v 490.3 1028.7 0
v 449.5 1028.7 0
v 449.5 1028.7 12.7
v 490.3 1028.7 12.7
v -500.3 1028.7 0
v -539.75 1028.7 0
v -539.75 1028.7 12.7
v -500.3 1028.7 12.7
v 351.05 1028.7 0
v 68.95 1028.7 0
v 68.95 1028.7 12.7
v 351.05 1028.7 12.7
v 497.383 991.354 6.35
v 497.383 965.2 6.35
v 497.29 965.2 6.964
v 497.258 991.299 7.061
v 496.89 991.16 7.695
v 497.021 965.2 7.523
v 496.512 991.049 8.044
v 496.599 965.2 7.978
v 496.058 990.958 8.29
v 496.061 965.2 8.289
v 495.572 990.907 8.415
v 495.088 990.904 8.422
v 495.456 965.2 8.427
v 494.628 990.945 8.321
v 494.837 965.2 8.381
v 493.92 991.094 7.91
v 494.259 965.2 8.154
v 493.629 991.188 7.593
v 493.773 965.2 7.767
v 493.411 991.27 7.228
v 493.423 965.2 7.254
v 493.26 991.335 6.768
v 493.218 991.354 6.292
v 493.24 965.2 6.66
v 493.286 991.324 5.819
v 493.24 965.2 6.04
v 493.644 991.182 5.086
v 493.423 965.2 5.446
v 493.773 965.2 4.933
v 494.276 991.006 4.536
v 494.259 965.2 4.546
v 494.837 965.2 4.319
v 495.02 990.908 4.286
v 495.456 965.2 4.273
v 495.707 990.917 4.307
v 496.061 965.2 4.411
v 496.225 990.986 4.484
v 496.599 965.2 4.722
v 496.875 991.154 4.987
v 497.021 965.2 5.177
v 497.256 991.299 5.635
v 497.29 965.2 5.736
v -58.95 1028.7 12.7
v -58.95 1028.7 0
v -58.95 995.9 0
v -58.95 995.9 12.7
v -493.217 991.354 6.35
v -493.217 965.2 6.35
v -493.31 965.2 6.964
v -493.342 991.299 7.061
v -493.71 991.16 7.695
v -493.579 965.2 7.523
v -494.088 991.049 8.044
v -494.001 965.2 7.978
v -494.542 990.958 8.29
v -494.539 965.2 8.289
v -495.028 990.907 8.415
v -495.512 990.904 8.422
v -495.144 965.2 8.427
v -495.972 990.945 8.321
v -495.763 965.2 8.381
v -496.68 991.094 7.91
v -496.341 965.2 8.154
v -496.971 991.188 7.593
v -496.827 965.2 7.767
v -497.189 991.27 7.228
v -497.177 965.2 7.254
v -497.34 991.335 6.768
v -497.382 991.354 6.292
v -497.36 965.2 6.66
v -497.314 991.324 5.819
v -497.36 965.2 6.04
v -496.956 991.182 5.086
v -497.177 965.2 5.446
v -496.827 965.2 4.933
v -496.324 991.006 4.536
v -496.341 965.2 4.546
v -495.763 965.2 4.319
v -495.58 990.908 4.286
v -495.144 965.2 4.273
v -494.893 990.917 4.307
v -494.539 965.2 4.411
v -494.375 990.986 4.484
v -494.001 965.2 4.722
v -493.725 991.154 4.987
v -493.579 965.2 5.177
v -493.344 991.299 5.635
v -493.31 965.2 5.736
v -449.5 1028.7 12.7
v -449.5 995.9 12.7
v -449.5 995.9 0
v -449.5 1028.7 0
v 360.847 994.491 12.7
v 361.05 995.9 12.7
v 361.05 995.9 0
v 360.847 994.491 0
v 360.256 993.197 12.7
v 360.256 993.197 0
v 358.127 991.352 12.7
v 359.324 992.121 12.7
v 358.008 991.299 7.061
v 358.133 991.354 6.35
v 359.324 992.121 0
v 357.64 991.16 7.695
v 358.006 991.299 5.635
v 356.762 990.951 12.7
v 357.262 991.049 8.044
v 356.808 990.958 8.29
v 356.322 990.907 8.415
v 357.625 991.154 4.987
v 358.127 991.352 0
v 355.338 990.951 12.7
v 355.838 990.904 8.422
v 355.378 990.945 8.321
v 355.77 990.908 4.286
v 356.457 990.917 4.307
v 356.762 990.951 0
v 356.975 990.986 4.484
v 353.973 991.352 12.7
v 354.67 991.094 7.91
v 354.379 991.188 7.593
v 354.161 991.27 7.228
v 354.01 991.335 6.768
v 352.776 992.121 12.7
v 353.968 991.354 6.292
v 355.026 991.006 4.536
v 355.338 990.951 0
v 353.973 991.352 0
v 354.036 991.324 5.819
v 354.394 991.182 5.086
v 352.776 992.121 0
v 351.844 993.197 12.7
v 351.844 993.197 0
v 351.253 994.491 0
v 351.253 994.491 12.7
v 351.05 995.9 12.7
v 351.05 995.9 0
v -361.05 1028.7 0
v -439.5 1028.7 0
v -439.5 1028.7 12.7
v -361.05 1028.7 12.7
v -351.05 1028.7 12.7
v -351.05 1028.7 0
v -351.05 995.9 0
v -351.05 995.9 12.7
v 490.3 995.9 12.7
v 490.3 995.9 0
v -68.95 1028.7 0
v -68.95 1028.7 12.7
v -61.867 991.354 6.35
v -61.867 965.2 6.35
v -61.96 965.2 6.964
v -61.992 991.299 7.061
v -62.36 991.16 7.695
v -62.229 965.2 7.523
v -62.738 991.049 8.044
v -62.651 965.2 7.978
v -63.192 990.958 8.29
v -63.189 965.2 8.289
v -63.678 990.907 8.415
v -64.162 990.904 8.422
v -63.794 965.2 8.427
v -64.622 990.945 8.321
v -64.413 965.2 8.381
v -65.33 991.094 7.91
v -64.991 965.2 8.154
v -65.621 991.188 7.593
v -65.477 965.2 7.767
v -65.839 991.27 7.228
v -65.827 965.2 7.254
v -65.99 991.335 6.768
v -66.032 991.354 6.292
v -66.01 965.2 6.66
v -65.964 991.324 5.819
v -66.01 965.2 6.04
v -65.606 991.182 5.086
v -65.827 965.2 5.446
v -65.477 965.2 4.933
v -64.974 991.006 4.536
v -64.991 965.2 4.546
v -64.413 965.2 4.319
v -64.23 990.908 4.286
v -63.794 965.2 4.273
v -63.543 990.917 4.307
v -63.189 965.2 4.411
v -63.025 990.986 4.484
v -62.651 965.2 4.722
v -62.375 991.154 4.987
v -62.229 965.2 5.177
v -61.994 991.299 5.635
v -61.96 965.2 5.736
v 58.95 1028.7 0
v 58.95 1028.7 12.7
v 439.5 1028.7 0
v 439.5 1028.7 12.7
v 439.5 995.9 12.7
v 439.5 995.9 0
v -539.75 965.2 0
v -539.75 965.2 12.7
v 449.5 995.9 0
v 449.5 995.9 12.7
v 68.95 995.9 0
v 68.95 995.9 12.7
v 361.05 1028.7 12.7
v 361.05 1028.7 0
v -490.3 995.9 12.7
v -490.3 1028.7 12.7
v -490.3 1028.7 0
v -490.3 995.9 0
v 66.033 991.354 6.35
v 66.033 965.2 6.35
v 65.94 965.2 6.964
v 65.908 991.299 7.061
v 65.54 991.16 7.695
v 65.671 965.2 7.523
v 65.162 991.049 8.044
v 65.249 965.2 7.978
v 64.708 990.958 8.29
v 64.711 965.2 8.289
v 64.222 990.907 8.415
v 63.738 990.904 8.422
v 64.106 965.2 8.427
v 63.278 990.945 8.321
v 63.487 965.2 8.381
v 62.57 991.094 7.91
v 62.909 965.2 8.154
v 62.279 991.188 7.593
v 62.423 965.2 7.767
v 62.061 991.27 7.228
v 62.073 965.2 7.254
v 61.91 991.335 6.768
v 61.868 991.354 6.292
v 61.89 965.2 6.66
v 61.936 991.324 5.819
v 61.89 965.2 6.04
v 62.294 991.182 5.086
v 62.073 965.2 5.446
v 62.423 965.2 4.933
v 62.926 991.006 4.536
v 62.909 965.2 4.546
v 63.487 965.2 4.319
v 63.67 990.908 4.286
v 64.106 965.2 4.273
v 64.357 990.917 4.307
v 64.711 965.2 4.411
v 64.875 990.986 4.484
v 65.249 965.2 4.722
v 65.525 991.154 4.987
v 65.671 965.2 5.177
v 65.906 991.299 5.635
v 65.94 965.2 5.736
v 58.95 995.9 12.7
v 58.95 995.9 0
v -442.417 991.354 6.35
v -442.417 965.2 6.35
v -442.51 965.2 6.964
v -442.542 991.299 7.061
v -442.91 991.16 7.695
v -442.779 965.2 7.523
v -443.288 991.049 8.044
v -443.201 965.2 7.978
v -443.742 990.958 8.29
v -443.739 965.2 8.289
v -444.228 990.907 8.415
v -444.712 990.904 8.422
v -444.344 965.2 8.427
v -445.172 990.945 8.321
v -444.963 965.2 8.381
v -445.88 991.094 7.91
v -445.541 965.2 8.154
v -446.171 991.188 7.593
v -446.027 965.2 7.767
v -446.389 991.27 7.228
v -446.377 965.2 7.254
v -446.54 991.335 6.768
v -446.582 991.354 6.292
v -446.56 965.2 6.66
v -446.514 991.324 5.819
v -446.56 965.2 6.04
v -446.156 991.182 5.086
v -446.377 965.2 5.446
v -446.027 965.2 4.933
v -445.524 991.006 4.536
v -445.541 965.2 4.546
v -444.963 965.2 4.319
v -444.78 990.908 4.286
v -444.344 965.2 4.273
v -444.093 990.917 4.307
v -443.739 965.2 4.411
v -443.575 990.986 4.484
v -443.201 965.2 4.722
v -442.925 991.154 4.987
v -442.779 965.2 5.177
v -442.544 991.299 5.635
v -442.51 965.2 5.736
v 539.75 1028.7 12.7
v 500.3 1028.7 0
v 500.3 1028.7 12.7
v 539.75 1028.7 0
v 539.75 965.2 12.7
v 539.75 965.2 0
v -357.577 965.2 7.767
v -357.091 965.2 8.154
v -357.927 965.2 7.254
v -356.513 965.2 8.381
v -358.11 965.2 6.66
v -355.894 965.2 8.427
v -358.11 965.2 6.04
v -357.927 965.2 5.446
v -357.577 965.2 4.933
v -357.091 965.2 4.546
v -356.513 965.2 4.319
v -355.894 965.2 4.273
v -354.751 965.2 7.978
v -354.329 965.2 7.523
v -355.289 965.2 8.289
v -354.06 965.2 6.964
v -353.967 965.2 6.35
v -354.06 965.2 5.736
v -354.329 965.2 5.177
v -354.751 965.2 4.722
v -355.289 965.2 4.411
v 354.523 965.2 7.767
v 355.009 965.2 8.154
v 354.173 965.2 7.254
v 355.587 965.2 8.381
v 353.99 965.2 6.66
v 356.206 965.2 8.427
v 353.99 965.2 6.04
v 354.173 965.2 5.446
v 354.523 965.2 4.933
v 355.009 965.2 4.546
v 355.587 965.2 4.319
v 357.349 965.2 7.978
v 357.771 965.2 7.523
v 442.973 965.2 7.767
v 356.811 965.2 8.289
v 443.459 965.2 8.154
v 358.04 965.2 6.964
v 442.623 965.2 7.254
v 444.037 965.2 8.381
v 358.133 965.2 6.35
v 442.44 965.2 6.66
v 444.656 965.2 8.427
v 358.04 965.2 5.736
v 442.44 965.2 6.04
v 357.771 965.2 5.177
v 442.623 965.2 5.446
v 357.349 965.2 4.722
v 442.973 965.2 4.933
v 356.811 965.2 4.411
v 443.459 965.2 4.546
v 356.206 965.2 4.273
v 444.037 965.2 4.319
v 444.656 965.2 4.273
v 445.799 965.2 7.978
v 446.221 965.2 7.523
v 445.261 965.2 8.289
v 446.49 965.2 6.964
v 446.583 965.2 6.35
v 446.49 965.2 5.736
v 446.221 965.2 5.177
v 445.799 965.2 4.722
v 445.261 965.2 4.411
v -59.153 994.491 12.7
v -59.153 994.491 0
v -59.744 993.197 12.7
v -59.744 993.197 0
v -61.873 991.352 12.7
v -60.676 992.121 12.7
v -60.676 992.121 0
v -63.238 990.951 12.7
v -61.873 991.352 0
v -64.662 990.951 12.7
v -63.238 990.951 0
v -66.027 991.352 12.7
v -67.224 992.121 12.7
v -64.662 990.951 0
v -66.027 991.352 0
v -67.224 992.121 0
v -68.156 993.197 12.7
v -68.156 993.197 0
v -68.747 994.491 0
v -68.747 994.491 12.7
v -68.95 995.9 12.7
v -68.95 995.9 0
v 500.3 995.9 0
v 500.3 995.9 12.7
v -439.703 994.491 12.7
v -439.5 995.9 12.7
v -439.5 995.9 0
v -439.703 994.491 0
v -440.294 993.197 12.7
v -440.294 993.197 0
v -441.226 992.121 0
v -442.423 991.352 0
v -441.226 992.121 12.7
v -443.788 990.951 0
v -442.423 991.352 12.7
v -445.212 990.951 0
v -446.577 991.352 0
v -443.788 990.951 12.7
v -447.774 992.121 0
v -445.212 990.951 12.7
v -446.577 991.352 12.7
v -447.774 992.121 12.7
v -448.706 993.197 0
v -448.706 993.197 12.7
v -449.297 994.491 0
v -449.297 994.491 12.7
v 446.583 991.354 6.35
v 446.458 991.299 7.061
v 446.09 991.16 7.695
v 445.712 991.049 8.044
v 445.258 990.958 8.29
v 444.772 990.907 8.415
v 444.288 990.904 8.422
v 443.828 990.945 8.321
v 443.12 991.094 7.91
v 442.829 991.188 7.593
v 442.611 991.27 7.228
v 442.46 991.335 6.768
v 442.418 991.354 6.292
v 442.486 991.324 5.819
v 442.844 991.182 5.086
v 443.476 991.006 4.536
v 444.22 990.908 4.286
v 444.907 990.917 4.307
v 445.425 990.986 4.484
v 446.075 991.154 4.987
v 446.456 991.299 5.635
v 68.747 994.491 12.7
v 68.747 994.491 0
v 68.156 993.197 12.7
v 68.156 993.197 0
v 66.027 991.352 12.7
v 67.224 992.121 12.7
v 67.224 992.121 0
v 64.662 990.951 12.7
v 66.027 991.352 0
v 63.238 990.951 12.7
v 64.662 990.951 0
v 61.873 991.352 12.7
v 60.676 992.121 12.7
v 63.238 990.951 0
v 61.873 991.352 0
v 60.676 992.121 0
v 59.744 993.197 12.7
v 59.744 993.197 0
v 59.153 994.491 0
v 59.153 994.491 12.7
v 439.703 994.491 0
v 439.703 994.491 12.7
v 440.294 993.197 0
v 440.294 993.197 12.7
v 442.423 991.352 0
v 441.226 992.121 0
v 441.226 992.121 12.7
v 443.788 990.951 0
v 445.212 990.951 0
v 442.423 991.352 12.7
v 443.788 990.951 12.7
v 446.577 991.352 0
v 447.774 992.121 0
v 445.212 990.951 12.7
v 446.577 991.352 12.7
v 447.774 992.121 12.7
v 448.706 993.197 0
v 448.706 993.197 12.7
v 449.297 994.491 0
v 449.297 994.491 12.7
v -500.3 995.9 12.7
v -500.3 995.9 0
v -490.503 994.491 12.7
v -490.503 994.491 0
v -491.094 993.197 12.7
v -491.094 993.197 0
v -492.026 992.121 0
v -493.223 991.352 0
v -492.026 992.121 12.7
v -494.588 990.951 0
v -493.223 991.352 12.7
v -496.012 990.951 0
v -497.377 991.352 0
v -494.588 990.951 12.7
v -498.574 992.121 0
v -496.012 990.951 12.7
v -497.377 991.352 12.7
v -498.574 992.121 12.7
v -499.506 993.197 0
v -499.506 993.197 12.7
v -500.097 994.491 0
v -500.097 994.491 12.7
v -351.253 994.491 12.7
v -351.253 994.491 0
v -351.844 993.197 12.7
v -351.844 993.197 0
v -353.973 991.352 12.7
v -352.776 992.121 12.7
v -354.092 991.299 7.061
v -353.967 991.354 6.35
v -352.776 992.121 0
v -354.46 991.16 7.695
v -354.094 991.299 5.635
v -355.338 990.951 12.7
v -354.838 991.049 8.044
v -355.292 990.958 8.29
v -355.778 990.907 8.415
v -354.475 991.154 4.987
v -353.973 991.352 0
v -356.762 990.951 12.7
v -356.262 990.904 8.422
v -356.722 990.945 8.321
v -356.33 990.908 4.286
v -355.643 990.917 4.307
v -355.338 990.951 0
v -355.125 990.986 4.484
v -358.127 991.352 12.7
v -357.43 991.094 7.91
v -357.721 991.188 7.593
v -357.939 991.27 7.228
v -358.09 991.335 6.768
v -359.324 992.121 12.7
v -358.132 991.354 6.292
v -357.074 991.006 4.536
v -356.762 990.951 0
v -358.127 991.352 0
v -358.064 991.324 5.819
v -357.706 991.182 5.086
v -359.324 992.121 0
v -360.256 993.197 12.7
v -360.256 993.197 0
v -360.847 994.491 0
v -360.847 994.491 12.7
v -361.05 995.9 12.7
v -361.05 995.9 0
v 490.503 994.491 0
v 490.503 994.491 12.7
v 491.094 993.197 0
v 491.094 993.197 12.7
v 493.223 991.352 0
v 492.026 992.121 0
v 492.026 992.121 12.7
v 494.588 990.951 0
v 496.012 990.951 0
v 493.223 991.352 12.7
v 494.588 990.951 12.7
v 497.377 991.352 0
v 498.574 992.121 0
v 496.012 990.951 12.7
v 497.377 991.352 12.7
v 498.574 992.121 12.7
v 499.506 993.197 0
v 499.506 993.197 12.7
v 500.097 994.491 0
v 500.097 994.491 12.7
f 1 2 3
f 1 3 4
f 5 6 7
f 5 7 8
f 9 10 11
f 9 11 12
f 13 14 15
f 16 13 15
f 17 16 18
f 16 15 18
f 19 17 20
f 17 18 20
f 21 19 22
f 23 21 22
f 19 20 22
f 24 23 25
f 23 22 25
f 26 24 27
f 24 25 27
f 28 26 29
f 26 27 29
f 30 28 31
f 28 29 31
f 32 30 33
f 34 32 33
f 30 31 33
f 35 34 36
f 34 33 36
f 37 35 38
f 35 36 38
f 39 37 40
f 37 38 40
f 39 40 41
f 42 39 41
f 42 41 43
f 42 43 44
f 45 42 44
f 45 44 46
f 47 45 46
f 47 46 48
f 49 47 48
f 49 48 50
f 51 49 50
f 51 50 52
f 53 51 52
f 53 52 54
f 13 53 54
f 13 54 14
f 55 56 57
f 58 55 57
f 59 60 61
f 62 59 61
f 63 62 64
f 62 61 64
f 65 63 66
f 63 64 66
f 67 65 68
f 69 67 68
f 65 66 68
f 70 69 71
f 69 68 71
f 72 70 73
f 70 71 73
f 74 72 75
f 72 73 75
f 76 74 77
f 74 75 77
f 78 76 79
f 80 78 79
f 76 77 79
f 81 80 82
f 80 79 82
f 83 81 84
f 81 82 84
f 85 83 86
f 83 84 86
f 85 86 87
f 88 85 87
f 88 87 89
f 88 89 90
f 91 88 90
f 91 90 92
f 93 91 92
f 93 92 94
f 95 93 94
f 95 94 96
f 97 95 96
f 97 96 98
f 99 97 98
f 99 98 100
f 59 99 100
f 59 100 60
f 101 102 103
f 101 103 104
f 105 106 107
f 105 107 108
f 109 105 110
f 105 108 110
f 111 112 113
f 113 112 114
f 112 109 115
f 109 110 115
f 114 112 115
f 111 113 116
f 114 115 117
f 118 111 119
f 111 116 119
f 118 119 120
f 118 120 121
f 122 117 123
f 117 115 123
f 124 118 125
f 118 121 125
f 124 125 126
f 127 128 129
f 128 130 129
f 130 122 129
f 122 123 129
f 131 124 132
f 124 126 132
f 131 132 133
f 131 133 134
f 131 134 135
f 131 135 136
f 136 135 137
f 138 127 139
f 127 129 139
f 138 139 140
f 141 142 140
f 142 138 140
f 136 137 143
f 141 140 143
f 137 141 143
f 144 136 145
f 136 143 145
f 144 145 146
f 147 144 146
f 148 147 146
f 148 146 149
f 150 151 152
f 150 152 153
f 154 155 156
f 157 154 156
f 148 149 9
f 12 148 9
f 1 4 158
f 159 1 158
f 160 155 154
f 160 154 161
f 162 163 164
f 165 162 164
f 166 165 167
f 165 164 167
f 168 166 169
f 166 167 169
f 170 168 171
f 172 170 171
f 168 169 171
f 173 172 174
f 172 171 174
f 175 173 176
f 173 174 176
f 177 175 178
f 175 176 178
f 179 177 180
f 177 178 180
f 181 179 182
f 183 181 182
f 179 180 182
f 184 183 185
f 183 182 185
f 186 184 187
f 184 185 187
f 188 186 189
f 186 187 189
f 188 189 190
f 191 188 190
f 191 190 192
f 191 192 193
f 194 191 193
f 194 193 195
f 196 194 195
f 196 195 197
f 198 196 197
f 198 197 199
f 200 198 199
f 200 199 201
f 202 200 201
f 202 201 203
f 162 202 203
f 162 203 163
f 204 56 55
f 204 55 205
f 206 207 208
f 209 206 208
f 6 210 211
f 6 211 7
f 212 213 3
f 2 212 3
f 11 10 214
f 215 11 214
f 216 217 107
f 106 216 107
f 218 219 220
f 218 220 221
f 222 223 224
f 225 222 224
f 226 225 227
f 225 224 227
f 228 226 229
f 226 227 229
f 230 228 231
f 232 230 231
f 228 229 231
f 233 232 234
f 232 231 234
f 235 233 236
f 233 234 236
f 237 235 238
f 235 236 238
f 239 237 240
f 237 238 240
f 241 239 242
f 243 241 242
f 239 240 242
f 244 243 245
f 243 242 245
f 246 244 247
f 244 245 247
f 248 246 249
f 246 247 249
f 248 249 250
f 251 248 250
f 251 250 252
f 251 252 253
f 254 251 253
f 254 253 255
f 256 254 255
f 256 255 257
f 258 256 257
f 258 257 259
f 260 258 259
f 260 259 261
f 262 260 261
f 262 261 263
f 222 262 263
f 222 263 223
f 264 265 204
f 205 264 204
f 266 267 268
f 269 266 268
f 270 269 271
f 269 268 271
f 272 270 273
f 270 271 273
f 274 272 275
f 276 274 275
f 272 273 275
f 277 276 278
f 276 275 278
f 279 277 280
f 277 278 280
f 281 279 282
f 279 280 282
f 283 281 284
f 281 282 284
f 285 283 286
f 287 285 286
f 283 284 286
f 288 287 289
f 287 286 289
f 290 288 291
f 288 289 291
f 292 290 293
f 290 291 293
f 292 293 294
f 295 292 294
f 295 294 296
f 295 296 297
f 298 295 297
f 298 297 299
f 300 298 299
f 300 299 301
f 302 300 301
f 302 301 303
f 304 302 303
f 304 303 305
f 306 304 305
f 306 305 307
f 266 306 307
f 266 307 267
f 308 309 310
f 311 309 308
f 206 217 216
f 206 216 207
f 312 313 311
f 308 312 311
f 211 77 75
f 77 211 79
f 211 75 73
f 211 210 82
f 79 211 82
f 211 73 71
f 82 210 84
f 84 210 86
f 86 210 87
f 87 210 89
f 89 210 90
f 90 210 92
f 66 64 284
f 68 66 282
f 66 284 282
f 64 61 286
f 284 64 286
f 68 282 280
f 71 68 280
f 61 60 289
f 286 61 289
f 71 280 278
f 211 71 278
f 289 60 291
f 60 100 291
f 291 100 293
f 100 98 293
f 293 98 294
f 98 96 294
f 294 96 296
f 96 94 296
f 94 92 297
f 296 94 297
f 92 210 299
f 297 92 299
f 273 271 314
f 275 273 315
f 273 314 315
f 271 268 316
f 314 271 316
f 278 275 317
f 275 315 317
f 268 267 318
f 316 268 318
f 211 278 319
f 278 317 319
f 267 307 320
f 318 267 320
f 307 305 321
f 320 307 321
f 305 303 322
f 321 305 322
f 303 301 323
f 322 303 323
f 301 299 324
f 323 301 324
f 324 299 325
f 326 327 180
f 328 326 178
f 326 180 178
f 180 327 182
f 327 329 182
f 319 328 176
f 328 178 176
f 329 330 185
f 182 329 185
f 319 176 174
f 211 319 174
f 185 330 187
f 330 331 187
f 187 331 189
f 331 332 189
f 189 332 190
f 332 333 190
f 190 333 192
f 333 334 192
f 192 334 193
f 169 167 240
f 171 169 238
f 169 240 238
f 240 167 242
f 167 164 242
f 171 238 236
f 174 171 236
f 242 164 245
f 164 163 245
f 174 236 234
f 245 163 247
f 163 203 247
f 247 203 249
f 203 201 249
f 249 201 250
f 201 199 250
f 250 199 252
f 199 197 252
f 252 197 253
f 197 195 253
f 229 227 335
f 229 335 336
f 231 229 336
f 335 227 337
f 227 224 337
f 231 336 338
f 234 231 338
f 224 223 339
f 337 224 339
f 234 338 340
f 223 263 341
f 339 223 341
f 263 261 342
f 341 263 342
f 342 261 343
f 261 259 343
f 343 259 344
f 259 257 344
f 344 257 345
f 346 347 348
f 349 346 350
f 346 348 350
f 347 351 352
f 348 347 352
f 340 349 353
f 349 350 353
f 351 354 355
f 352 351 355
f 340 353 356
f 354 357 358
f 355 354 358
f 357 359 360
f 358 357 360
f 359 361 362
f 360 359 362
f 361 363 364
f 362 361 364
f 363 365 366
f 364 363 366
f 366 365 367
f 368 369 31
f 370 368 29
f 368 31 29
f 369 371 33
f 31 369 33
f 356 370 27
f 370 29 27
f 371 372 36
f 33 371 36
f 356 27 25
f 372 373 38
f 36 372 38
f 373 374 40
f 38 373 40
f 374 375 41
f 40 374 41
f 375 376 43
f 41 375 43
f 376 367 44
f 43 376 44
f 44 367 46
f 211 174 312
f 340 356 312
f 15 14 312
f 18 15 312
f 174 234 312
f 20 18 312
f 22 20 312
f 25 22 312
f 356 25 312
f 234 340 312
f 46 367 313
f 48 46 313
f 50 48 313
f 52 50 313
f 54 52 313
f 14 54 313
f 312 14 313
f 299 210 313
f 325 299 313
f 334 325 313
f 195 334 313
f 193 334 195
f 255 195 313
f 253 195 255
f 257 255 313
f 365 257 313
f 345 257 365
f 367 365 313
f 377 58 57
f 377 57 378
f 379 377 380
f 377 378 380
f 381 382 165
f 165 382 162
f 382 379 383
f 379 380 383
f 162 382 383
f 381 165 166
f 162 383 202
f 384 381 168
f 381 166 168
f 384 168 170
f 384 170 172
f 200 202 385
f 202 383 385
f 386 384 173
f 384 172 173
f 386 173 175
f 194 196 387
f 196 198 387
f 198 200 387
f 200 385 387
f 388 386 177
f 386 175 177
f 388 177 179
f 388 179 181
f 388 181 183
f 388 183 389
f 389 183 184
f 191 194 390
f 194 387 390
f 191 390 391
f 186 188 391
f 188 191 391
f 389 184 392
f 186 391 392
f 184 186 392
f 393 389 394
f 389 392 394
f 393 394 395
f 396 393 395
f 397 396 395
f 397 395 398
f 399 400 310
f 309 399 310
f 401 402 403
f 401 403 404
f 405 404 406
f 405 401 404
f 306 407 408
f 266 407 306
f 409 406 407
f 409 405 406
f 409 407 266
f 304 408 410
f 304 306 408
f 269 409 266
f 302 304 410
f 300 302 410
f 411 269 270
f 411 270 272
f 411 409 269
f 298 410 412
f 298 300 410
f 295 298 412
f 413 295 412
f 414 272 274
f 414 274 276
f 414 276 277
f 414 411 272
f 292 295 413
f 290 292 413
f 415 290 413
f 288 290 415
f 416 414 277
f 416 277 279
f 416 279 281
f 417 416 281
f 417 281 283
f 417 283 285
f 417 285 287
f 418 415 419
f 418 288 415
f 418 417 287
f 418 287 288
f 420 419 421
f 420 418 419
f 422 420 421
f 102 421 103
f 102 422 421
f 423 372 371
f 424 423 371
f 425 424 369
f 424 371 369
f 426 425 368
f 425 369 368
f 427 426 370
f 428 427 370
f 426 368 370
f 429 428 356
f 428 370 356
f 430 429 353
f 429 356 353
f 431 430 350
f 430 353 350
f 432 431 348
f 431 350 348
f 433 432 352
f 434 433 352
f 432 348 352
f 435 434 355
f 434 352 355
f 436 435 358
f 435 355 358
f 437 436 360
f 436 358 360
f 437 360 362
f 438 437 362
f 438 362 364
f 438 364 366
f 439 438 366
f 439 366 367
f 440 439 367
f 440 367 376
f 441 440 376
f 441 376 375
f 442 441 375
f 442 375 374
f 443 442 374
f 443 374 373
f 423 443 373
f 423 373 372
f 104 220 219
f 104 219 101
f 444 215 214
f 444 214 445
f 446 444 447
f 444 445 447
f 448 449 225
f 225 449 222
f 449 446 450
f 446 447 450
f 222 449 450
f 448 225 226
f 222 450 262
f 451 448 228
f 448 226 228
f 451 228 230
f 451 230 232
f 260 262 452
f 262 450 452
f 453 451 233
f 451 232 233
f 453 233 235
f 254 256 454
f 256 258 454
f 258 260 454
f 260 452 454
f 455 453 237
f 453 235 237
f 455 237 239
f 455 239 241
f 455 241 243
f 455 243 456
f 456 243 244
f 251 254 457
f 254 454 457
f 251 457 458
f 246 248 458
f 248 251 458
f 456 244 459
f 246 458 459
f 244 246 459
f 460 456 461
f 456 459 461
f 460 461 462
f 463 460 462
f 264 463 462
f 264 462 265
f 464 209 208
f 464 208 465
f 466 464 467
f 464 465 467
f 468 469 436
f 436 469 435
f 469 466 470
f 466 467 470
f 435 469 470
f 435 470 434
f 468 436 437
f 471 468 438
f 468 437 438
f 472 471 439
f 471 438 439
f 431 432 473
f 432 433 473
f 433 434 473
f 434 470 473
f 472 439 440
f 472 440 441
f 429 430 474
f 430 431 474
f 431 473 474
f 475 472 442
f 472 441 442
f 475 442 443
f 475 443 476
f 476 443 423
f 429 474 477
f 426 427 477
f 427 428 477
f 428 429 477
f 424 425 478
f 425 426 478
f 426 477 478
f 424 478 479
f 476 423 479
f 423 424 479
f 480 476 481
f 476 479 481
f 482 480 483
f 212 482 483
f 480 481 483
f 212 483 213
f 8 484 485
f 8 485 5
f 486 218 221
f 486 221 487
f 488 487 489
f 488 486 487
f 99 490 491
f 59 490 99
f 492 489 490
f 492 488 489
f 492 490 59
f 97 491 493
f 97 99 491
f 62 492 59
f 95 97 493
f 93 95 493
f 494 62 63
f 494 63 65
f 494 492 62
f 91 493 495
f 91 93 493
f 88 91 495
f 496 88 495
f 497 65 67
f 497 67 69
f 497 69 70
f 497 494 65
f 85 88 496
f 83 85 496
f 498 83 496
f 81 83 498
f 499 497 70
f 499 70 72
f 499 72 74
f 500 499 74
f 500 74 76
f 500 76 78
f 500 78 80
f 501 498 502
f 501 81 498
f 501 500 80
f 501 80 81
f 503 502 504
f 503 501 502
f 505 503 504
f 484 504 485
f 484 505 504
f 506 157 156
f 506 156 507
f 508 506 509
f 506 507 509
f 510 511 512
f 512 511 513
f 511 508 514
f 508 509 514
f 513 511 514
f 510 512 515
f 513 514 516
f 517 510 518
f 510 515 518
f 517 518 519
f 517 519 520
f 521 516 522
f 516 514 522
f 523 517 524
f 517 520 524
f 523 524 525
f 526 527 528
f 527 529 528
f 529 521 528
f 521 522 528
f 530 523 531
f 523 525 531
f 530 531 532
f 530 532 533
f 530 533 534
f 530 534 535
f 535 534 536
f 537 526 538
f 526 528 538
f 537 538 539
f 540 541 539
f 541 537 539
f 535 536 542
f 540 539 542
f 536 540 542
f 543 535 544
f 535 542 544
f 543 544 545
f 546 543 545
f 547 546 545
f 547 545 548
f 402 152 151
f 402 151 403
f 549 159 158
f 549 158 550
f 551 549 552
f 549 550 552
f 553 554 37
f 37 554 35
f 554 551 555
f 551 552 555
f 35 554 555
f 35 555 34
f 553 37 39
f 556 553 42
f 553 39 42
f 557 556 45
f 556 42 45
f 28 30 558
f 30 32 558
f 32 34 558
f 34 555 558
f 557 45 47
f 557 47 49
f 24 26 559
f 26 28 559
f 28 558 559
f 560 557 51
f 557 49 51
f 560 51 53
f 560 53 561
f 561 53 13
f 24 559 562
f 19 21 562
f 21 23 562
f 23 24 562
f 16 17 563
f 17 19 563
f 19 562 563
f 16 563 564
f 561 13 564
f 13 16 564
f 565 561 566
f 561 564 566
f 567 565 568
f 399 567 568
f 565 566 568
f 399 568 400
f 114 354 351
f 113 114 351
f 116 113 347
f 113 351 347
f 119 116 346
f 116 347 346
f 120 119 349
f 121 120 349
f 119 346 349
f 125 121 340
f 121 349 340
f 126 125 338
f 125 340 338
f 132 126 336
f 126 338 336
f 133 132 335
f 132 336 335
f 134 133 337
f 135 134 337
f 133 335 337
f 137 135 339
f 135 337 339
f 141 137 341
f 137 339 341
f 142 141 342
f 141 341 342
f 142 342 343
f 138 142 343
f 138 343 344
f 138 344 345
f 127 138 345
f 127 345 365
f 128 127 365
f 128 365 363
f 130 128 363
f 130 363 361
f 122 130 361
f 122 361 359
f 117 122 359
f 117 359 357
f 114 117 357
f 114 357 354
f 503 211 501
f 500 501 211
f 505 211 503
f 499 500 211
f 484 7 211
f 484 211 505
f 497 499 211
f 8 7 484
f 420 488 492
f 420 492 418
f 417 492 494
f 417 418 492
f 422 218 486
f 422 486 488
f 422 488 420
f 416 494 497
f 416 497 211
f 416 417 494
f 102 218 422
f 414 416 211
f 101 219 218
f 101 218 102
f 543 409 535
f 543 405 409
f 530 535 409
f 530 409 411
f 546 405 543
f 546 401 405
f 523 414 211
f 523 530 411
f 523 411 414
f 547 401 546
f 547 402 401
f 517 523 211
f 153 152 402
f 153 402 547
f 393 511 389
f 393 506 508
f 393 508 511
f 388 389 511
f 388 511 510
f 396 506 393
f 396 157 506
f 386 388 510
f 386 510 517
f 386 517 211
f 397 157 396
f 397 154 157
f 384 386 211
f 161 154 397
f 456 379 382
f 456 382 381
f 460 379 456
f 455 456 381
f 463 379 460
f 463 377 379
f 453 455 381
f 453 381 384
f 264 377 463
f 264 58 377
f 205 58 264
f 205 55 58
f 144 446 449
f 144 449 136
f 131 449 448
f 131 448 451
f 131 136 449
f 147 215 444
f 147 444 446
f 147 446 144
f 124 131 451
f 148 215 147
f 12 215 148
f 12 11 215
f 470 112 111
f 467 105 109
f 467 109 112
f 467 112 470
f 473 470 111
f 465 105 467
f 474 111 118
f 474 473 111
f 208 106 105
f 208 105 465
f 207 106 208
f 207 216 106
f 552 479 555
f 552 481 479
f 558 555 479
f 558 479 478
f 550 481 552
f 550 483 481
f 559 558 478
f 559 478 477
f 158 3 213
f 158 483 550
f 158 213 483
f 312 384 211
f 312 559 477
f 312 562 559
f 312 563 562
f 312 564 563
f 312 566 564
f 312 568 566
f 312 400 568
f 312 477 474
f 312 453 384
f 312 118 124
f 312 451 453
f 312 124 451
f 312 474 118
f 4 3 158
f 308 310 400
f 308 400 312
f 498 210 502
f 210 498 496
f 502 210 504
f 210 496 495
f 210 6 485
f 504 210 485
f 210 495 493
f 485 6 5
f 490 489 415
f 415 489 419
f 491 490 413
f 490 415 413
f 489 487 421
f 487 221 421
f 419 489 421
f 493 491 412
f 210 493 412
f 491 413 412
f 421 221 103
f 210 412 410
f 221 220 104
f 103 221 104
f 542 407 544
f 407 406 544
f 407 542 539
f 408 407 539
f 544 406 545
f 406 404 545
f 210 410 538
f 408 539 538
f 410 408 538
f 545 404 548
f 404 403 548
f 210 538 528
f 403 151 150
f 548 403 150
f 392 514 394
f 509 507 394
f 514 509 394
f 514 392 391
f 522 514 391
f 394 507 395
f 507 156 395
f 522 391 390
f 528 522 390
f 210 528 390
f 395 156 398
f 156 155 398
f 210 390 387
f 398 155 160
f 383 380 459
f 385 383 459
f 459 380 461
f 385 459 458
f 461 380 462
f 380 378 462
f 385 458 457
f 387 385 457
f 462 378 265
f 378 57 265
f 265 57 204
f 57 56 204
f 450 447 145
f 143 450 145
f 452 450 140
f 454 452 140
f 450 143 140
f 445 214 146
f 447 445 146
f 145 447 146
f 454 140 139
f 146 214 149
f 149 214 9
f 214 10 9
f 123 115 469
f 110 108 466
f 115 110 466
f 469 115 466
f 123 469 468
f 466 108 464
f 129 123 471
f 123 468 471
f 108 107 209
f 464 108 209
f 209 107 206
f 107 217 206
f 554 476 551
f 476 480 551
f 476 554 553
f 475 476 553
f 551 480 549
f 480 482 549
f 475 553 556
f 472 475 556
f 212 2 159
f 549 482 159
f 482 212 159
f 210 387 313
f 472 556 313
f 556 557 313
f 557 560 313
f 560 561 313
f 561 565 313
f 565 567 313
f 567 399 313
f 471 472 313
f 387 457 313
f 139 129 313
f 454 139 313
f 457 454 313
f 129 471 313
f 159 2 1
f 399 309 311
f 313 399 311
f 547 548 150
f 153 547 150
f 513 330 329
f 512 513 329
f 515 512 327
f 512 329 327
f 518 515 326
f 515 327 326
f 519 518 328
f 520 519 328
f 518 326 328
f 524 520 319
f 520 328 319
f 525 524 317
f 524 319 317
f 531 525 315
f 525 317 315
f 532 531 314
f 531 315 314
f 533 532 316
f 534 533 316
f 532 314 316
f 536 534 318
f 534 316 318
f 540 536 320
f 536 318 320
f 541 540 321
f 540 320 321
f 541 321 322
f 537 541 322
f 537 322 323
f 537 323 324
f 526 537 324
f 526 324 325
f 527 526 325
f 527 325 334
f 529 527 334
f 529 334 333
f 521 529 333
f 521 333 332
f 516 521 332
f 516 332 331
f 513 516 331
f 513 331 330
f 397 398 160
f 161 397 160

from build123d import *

# Parameters (mm, degrees)
SKETCH1_W          = 1079.5
SKETCH1_H          = 63.5
EXTRUDE1_DEPTH     = 12.7
CUT_EXTRUDE1_DEPTH = 13.7
SKETCH6_R          = 2.0828
CUT_EXTRUDE3_DEPTH = 64.5
CUT_EXTRUDE4_DEPTH = 13.7000001
SKETCH8_R          = 2.0828
CUT_EXTRUDE5_DEPTH = 64.5


with BuildPart() as part:
    # Sketch1 → Extrude1 (new body)
    with BuildSketch(Plane.XY):
        with Locations((0, 996.95)):
            Rectangle(SKETCH1_W, SKETCH1_H)
    extrude(amount=EXTRUDE1_DEPTH)

    # Sketch4 → Cut-Extrude1 (cut, through all)
    with BuildSketch(Plane(origin=(0, 0, 0), x_dir=(-1, 0, 0), z_dir=(0, 0, -1))):
        with BuildLine():
            Line((-68.95, 1028.7), (-68.95, 995.9))
            ThreePointArc((-68.95, 995.9), (-63.95, 990.9), (-58.95, 995.9))
            Line((-58.95, 995.9), (-58.95, 1028.7))
            Line((-58.95, 1028.7), (-68.95, 1028.7))
        make_face()
        with BuildLine():
            Line((-351.05, 1028.7), (-361.05, 1028.7))
            Line((-361.05, 1028.7), (-361.05, 995.9))
            ThreePointArc((-361.05, 995.9), (-356.05, 990.9), (-351.05, 995.9))
            Line((-351.05, 995.9), (-351.05, 1028.7))
        make_face()
        with BuildLine():
            Line((58.95, 1028.7), (58.95, 995.9))
            ThreePointArc((58.95, 995.9), (63.95, 990.9), (68.95, 995.9))
            Line((68.95, 995.9), (68.95, 1028.7))
            Line((68.95, 1028.7), (58.95, 1028.7))
        make_face()
        with BuildLine():
            Line((351.05, 1028.7), (351.05, 995.9))
            ThreePointArc((351.05, 995.9), (356.05, 990.9), (361.05, 995.9))
            Line((361.05, 995.9), (361.05, 1028.7))
            Line((361.05, 1028.7), (351.05, 1028.7))
        make_face()
    extrude(amount=-CUT_EXTRUDE1_DEPTH, mode=Mode.SUBTRACT)

    # Sketch6 → Cut-Extrude3 (cut, through all)
    with BuildSketch(Plane.XZ.offset(-965.2)):
        with Locations((-356.05, 6.35)):
            Circle(SKETCH6_R)
        with Locations((356.05, 6.35)):
            Circle(SKETCH6_R)
        with Locations((63.95, 6.35)):
            Circle(SKETCH6_R)
        with Locations((-63.95, 6.35)):
            Circle(SKETCH6_R)
    extrude(amount=-CUT_EXTRUDE3_DEPTH, mode=Mode.SUBTRACT)

    # Sketch7 → Cut-Extrude4 (cut, through all)
    with BuildSketch(Plane.XY.offset(12.7)):
        with BuildLine():
            Line((-449.5, 995.9), (-449.5, 1028.7))
            Line((-449.5, 1028.7), (-439.5, 1028.7))
            Line((-439.5, 1028.7), (-439.5, 995.9))
            ThreePointArc((-439.5, 995.9), (-444.5, 990.9), (-449.5, 995.9))
        make_face()
        with BuildLine():
            Line((-500.3, 995.9), (-500.3, 1028.7))
            Line((-500.3, 1028.7), (-490.3, 1028.7))
            Line((-490.3, 1028.7), (-490.3, 995.9))
            ThreePointArc((-490.3, 995.9), (-495.3, 990.9), (-500.3, 995.9))
        make_face()
        with BuildLine():
            Line((490.3, 1028.7), (490.3, 995.9))
            ThreePointArc((490.3, 995.9), (495.3, 990.9), (500.3, 995.9))
            Line((500.3, 995.9), (500.3, 1028.7))
            Line((500.3, 1028.7), (490.3, 1028.7))
        make_face()
        with BuildLine():
            Line((439.5, 1028.7), (439.5, 995.9))
            ThreePointArc((439.5, 995.9), (444.5, 990.9), (449.5, 995.9))
            Line((449.5, 995.9), (449.5, 1028.7))
            Line((449.5, 1028.7), (439.5, 1028.7))
        make_face()
    extrude(amount=-CUT_EXTRUDE4_DEPTH, mode=Mode.SUBTRACT)

    # Sketch8 → Cut-Extrude5 (cut, through all)
    with BuildSketch(Plane.XZ.offset(-965.2)):
        with Locations((-495.3, 6.35)):
            Circle(SKETCH8_R)
        with Locations((-444.5, 6.35)):
            Circle(SKETCH8_R)
        with Locations((444.5, 6.35)):
            Circle(SKETCH8_R)
        with Locations((495.3, 6.35)):
            Circle(SKETCH8_R)
    extrude(amount=-CUT_EXTRUDE5_DEPTH, mode=Mode.SUBTRACT)


solid = part.part
